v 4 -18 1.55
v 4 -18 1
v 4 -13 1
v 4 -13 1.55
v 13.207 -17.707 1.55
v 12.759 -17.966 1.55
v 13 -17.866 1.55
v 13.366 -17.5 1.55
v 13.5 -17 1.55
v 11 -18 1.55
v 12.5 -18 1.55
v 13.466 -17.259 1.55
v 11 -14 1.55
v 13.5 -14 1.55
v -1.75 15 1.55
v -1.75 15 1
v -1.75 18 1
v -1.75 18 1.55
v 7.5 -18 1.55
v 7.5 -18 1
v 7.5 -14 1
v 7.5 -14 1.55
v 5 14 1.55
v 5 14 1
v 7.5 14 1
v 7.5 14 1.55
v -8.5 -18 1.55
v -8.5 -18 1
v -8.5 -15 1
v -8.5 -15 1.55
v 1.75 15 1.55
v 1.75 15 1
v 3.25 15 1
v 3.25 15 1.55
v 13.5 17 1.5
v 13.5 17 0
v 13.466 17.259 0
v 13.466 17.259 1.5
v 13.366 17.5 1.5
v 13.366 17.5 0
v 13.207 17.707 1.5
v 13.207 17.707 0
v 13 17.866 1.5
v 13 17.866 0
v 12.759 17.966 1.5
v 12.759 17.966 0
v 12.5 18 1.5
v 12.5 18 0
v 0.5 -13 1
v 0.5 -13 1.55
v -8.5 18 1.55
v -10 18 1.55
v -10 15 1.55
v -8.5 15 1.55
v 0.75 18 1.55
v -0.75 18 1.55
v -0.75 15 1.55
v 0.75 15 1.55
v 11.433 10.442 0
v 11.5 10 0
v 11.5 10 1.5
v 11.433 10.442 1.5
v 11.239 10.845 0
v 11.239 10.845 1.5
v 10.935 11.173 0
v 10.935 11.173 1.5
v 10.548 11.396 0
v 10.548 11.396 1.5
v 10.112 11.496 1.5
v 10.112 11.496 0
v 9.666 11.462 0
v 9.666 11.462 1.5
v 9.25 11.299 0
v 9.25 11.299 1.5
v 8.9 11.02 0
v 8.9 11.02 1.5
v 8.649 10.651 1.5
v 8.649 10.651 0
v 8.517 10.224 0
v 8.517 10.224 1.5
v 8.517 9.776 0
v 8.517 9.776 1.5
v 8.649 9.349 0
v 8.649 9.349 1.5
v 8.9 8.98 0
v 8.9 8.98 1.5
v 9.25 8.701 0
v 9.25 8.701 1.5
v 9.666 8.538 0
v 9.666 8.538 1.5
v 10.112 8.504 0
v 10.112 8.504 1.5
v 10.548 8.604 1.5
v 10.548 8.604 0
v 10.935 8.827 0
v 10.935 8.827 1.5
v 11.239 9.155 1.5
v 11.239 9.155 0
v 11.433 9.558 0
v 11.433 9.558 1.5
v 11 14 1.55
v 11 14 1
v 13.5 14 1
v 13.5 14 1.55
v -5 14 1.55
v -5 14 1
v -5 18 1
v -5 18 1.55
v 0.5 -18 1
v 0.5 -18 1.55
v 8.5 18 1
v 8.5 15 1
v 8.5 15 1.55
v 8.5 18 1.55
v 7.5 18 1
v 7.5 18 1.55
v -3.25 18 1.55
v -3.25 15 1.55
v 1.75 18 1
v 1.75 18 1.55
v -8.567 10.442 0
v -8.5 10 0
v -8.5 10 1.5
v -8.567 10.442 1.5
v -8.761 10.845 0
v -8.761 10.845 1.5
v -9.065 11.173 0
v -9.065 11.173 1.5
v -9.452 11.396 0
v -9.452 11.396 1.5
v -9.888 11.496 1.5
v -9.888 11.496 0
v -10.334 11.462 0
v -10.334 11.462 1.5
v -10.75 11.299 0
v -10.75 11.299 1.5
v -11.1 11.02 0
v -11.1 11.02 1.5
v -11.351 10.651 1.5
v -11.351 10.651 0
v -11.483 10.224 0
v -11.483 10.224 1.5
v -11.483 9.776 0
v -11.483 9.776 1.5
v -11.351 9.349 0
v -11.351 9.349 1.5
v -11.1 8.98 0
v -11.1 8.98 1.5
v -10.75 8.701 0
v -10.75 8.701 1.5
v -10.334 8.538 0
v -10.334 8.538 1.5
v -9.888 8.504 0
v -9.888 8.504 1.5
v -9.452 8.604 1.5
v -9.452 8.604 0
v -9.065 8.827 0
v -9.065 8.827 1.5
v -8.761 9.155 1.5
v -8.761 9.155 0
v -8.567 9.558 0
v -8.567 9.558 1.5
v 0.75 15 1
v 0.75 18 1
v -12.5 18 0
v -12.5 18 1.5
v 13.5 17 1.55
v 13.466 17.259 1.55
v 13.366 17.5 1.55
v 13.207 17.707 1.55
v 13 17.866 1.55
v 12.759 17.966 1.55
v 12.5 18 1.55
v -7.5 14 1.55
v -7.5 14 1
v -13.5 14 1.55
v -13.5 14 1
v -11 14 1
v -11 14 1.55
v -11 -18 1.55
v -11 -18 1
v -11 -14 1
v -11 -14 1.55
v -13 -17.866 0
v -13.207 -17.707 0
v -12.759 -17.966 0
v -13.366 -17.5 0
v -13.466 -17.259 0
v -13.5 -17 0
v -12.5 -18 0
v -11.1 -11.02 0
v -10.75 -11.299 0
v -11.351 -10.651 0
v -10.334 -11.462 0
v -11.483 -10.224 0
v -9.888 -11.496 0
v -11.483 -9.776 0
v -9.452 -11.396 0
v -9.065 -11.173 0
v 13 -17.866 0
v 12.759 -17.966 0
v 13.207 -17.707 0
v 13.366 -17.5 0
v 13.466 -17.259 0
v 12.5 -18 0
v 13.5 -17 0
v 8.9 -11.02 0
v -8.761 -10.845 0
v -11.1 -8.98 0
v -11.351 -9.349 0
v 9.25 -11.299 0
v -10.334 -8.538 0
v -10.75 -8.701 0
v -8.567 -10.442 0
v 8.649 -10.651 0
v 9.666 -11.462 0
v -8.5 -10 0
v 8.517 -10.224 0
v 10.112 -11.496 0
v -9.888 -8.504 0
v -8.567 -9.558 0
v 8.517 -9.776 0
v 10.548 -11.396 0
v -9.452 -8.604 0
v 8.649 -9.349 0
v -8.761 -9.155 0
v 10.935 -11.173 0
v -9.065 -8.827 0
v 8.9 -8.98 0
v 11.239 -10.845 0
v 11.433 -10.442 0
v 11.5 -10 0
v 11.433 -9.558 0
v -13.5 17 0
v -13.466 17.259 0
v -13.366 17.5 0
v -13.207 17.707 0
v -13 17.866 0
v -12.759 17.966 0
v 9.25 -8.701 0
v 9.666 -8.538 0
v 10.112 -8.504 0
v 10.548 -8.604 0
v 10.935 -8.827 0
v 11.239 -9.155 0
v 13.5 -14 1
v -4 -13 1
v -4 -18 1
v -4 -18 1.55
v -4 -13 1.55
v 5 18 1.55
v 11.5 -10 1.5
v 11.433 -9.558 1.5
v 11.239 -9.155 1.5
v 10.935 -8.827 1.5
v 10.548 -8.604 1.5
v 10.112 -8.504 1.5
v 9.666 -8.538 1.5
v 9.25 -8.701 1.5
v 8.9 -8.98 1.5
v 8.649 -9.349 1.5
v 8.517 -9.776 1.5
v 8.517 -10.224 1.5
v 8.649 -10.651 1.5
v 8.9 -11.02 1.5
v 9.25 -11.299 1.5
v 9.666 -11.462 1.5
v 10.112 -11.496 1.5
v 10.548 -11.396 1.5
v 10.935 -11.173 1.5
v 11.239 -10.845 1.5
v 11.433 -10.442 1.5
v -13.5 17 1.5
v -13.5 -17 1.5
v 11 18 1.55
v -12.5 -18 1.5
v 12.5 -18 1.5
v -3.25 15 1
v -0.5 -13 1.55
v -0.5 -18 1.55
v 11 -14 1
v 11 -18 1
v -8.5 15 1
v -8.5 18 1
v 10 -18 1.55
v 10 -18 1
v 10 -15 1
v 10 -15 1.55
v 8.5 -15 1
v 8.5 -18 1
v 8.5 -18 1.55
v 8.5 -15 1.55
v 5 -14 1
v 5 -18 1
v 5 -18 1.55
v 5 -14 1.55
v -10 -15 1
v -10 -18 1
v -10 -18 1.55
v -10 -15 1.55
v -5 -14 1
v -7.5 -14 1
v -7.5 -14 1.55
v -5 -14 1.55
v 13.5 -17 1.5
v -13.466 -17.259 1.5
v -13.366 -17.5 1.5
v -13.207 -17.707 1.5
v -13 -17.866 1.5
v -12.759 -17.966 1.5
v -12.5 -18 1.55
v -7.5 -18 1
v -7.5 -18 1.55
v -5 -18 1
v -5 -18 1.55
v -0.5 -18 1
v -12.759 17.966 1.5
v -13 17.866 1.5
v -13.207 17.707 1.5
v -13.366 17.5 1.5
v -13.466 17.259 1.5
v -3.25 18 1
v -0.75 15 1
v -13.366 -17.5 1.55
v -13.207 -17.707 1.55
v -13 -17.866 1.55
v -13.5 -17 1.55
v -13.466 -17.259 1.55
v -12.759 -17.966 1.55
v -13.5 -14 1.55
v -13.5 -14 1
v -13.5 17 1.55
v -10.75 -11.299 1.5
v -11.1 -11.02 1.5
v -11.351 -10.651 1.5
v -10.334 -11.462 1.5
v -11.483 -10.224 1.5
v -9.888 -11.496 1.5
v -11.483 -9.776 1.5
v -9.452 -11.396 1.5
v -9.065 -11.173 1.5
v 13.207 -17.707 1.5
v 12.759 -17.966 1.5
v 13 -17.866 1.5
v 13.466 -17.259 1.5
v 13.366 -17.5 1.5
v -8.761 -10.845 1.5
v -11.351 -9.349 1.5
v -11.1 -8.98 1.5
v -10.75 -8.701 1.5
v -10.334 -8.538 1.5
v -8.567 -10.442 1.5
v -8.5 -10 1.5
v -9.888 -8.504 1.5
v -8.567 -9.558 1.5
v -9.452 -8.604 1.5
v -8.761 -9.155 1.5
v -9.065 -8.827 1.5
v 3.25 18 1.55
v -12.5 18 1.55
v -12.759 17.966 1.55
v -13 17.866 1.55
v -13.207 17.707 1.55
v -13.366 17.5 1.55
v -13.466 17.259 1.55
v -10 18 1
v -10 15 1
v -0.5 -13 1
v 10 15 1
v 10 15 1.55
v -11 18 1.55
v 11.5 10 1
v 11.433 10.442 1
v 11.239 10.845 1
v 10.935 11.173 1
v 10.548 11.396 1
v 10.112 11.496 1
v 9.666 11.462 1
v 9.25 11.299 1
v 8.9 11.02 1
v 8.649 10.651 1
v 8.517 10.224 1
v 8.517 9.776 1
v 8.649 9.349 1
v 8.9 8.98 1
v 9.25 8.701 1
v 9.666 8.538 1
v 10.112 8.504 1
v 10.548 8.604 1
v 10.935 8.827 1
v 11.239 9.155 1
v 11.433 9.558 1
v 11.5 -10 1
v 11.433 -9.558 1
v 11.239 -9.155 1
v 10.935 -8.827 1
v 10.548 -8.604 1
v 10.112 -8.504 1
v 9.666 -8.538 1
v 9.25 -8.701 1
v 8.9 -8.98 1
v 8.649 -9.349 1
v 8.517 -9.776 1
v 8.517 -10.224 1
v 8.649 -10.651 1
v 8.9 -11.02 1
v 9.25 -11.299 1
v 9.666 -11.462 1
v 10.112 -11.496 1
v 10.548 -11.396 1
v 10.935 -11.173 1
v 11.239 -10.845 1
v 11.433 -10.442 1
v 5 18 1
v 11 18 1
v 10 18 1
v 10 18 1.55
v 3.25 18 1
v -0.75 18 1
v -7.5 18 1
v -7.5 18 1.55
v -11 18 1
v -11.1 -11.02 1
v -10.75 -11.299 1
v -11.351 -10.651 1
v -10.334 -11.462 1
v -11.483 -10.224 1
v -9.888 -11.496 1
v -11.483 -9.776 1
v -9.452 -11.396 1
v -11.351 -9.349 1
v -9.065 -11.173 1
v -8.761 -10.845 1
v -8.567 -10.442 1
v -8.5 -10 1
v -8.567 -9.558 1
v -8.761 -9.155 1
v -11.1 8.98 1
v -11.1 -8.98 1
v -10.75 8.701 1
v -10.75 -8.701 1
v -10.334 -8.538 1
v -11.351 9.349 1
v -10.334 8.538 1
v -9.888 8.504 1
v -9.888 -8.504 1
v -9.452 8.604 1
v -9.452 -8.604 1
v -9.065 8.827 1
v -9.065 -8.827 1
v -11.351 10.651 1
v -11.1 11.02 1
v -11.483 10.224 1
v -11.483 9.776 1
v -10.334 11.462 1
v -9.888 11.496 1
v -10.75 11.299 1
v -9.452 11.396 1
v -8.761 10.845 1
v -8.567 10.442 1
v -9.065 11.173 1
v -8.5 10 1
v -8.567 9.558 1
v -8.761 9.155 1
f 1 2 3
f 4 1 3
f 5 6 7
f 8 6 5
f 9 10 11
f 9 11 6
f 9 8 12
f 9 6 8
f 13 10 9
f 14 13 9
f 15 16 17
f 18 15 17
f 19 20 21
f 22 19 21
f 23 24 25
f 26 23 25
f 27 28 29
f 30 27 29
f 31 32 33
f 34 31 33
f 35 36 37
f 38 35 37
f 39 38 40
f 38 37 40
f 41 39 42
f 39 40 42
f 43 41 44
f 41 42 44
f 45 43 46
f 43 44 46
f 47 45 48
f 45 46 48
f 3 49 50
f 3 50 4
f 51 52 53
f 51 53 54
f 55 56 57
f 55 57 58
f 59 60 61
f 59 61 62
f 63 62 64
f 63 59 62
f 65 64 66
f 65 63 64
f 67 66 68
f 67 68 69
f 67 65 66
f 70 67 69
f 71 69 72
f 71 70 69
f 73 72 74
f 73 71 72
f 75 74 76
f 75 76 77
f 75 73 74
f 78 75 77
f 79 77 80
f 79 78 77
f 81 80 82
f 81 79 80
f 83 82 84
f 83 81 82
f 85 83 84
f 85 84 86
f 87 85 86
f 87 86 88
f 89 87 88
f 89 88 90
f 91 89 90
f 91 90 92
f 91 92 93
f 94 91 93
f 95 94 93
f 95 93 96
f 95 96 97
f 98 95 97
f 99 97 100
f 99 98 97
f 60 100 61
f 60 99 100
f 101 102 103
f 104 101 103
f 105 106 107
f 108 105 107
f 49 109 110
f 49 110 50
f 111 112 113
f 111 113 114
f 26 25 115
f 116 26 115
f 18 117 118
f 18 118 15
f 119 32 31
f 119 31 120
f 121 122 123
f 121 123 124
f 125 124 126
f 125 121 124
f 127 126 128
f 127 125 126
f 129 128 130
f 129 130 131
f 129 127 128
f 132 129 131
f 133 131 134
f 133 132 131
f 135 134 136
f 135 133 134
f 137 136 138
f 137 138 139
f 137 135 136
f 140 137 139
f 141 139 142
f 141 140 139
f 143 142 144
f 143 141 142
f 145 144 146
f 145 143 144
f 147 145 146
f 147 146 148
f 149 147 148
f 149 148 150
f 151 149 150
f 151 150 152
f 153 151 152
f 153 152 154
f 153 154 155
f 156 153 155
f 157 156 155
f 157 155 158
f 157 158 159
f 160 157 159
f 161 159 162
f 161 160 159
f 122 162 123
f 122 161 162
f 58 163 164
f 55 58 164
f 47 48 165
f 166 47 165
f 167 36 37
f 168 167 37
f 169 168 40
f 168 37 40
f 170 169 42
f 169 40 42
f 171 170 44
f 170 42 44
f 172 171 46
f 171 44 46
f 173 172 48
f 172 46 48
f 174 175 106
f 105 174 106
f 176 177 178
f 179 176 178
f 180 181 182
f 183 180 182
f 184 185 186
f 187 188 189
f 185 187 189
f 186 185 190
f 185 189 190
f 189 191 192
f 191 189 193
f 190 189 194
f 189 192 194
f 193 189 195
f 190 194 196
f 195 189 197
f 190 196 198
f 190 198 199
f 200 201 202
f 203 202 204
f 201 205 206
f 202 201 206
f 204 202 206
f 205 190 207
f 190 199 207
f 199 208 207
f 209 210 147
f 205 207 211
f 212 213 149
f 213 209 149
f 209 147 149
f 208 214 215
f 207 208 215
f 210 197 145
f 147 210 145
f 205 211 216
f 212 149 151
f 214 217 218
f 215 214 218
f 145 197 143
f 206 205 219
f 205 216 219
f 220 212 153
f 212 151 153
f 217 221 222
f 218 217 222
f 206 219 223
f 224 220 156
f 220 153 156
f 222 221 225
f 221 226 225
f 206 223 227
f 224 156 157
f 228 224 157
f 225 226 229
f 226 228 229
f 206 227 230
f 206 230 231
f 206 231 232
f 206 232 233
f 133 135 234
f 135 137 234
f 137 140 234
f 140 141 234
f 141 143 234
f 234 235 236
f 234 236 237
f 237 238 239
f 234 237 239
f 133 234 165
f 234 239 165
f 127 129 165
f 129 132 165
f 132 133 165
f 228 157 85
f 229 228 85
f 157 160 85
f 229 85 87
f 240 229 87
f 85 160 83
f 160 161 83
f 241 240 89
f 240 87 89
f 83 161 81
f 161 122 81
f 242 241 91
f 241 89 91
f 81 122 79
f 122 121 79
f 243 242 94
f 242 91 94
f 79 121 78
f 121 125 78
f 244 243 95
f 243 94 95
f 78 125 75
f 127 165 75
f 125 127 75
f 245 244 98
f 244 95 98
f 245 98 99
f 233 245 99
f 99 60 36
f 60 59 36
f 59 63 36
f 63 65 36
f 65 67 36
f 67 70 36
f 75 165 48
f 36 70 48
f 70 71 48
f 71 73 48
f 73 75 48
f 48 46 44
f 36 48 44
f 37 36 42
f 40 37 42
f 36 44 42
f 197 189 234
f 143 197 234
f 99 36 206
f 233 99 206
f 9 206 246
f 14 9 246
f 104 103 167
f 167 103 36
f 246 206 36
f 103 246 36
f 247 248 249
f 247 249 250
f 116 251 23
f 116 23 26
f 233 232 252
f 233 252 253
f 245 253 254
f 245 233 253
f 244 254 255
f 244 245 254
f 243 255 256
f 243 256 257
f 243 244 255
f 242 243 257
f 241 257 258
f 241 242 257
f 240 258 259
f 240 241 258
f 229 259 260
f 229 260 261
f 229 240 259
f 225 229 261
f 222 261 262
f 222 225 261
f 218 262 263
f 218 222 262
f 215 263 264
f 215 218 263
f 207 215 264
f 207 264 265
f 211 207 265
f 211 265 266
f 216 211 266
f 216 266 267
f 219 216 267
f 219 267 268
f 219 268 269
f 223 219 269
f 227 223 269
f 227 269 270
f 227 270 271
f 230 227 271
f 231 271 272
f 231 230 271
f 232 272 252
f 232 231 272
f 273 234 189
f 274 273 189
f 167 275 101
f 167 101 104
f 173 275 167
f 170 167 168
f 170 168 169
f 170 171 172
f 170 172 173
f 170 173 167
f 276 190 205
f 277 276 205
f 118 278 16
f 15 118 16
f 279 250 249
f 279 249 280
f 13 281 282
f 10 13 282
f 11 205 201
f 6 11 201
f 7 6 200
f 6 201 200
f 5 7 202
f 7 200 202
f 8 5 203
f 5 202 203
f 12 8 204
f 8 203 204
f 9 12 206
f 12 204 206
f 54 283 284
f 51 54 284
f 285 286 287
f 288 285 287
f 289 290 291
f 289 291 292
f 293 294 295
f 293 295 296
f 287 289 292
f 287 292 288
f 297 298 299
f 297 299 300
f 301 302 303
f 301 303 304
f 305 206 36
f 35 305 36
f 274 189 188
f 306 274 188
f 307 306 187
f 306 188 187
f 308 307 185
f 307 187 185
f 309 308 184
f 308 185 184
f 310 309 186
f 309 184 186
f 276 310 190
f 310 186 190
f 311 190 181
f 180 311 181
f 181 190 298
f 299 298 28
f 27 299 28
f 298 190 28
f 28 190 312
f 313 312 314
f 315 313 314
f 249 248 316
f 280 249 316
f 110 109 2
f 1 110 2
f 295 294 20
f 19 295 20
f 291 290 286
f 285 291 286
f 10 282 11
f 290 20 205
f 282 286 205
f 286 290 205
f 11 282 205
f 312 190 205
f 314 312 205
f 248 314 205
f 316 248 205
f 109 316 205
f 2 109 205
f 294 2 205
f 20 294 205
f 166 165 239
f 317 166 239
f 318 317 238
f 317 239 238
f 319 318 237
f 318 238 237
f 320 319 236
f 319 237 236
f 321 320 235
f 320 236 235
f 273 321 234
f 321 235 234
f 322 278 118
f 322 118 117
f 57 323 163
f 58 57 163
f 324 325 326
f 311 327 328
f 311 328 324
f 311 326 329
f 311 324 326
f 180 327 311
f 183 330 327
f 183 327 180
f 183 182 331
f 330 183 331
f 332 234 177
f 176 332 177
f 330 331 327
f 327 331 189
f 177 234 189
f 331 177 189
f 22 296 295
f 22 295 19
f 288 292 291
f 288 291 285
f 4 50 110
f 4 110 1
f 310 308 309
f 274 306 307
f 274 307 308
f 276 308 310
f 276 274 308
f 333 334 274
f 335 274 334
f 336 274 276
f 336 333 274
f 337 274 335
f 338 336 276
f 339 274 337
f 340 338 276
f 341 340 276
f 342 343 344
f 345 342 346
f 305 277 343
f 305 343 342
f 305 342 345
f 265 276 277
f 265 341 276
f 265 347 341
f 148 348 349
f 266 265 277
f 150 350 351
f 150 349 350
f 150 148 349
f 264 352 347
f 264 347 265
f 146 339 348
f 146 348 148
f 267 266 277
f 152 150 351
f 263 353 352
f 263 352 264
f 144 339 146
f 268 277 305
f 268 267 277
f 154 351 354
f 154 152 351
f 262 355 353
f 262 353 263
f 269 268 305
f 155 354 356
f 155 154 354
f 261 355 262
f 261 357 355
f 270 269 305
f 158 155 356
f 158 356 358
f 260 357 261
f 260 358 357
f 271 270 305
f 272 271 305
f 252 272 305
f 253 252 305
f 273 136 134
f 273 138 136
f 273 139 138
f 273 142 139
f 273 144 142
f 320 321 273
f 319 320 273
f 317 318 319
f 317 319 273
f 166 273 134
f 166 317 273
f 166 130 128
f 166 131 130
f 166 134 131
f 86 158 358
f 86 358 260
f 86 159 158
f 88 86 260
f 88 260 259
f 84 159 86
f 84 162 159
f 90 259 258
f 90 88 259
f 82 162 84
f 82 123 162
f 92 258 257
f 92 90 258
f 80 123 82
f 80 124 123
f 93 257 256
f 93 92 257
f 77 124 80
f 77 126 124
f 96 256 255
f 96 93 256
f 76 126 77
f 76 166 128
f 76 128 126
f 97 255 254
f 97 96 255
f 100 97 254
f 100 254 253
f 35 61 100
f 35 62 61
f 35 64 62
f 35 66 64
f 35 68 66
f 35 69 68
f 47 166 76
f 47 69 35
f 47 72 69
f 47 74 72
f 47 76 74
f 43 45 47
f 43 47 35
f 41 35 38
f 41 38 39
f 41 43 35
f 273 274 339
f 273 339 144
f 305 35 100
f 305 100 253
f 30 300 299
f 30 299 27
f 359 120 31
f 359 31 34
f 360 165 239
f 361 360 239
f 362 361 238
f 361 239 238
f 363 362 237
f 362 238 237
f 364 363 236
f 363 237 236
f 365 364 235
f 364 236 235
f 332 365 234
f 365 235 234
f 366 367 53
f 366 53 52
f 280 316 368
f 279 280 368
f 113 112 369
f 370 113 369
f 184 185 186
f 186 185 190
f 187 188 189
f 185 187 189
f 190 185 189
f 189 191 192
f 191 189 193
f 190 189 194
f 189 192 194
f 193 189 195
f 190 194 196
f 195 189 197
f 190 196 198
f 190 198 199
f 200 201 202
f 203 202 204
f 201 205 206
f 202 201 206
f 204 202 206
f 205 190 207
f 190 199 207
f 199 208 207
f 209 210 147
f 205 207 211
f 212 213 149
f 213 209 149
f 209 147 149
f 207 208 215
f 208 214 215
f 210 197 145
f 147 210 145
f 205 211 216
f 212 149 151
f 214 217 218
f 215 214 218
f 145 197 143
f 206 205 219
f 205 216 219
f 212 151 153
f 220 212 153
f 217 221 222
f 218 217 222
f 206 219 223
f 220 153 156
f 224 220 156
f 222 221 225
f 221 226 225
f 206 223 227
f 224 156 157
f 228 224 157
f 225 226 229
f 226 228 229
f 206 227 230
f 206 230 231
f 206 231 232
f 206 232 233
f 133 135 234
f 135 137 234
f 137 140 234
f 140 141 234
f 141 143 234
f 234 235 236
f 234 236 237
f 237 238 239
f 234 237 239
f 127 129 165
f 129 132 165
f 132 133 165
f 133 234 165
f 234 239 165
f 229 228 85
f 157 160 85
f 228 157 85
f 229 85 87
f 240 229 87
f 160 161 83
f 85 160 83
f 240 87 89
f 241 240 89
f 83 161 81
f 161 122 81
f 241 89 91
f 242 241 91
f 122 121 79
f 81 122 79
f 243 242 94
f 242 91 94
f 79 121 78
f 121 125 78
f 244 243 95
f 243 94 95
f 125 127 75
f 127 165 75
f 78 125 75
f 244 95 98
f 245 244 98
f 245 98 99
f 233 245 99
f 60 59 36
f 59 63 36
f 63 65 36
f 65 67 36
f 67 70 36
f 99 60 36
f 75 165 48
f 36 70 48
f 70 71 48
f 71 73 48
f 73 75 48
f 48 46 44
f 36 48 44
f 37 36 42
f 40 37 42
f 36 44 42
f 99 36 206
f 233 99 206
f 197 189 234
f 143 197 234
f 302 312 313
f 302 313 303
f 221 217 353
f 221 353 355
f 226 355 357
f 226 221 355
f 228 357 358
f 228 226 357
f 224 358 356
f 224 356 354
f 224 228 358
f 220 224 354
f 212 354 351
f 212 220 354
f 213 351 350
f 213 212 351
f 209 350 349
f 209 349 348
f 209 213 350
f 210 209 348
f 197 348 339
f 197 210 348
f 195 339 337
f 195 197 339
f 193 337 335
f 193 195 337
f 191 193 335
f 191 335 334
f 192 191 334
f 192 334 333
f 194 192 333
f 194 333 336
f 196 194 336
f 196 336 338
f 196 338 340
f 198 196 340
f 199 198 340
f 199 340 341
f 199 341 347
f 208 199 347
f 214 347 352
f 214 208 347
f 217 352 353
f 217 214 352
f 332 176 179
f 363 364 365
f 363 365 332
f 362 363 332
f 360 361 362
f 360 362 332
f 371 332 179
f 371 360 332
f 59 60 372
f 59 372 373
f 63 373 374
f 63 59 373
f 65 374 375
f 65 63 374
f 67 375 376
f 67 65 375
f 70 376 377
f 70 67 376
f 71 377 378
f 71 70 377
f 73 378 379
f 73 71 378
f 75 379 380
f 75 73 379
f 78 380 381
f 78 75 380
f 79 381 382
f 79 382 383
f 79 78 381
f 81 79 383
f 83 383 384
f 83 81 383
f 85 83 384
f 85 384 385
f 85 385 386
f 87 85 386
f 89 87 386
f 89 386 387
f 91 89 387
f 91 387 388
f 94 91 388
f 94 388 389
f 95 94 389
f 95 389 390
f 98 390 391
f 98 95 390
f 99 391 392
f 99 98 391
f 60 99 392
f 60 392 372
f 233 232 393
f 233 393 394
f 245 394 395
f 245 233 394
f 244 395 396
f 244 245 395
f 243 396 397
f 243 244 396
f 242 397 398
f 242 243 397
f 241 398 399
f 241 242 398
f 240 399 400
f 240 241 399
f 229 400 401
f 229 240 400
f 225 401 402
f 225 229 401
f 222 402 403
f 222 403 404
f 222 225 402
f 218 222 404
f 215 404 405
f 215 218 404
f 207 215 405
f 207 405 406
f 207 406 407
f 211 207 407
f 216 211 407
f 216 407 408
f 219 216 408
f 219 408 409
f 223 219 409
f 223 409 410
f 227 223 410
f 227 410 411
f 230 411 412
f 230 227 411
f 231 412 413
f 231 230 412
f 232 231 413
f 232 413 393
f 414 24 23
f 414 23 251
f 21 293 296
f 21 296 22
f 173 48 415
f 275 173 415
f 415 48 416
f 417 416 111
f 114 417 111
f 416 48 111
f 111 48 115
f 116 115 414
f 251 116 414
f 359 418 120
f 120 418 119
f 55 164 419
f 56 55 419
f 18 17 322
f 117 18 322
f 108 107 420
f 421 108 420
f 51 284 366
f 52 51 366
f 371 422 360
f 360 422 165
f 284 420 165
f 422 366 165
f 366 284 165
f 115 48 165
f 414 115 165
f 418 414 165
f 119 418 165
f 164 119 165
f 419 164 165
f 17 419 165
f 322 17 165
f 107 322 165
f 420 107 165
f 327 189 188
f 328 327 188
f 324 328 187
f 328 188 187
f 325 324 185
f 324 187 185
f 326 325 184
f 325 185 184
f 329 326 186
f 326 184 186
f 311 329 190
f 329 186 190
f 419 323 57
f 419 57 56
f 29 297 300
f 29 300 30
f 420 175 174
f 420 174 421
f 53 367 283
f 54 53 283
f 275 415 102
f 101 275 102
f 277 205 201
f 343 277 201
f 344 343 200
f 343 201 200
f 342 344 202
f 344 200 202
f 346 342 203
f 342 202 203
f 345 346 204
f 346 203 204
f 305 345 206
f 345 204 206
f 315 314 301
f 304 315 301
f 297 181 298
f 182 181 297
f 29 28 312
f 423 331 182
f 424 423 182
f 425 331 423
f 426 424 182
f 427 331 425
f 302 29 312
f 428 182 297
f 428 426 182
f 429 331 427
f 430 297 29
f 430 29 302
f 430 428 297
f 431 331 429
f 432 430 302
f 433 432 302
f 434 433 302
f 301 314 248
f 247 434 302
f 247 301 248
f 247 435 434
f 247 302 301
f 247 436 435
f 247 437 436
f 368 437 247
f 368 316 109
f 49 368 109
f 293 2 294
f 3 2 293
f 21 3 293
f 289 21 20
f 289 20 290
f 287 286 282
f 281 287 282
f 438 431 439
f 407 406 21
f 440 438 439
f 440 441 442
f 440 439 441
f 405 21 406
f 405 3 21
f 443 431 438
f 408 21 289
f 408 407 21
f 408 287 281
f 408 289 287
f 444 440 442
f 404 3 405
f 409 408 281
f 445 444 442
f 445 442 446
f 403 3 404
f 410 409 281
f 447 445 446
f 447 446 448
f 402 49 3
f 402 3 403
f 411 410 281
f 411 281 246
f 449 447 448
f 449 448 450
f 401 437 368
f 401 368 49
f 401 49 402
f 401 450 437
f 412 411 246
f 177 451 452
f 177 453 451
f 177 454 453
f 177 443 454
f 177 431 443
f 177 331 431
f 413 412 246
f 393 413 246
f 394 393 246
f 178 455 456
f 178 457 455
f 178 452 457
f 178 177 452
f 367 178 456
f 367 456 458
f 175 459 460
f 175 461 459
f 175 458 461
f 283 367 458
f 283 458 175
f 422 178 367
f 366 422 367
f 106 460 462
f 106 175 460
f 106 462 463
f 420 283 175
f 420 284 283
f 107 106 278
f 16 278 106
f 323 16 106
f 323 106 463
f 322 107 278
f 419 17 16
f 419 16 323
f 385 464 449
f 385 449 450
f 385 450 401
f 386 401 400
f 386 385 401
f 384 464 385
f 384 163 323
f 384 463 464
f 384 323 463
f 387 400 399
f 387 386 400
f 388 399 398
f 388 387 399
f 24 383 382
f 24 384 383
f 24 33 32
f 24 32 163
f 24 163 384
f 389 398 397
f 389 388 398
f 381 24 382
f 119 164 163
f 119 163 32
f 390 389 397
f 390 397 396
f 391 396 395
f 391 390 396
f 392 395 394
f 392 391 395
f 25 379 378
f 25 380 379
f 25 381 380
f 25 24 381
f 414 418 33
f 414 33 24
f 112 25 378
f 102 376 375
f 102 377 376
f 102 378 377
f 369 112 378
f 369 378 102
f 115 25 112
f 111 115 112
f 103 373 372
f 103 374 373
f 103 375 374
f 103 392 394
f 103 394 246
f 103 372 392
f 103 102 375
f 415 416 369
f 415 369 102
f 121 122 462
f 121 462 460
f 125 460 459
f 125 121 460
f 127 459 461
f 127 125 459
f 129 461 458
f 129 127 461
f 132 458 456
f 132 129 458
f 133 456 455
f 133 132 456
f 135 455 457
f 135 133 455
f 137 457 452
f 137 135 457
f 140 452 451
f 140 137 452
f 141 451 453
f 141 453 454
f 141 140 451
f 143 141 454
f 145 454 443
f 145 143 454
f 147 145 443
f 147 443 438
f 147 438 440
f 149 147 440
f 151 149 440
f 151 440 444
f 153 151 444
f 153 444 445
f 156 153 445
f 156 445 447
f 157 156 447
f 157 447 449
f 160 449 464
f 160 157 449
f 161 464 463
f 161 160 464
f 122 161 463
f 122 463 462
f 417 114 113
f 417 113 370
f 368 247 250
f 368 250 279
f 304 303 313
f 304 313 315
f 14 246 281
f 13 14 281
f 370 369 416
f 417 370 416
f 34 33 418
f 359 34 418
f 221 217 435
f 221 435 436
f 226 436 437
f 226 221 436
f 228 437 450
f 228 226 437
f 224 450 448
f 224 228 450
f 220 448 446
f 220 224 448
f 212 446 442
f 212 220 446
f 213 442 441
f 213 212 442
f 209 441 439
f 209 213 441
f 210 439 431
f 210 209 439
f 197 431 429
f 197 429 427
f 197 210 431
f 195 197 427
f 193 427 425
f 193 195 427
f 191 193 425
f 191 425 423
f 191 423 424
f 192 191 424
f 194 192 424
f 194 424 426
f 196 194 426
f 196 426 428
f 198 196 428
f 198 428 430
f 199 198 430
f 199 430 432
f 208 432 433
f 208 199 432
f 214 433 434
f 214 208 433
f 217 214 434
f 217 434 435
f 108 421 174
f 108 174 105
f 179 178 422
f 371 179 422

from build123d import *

# Parameters (mm, degrees)
F0_R     = 1.5
F0_W     = 1.5
F0_H     = 3
F0_W_2   = 2.5
F0_H_2   = 4
F0_W_3   = 3.5
F0_H_3   = 5
F1_DEPTH = 1.5
F2_DEPTH = 1
F3_DEPTH = 1.55


# Not quite as in the source:
# - a feature names something its author has since deleted; it is built from what else it names


with BuildPart() as f1:
    # F0 (on Top) → F1 (new body)
    with BuildSketch(Plane.XY):
        with BuildLine():
            ThreePointArc((13.5, 17), (13.2071067812, 17.7071067812), (12.5, 18))
            Line((12.5, 18), (11, 18))
            Line((11, 18), (11, 14))
            Line((11, 14), (13.5, 14))
            Line((13.5, 14), (13.5, 17))
        make_face()
        Polygon((11, 14), (11, 18), (10, 18), (10, 15), (8.5, 15), (8.5, 18), (7.5, 18), (7.5, 14), (5, 14), (5, 18), (3.25, 18), (3.25, 15), (1.75, 15), (1.75, 18), (0.75, 18), (0.75, 15), (-0.75, 15), (-0.75, 18), (-1.75, 18), (-1.75, 15), (-3.25, 15), (-3.25, 18), (-5, 18), (-5, 14), (-7.5, 14), (-7.5, 18), (-8.5, 18), (-8.5, 15), (-10, 15), (-10, 18), (-11, 18), (-11, 14), (-13.5, 14), (-13.5, -14), (-11, -14), (-11, -18), (-10, -18), (-10, -15), (-8.5, -15), (-8.5, -18), (-7.5, -18), (-7.5, -14), (-5, -14), (-5, -18), (-4, -18), (-4, -13), (-0.5, -13), (-0.5, -18), (0.5, -18), (0.5, -13), (4, -13), (4, -18), (5, -18), (5, -14), (7.5, -14), (7.5, -18), (8.5, -18), (8.5, -15), (10, -15), (10, -18), (11, -18), (11, -14), (13.5, -14), (13.5, 14), align=None)
        with Locations((-10, -10)):
            Circle(F0_R, mode=Mode.SUBTRACT)
        with Locations((10, -10)):
            Circle(F0_R, mode=Mode.SUBTRACT)
        with Locations((-10, 10)):
            Circle(F0_R, mode=Mode.SUBTRACT)
        with Locations((10, 10)):
            Circle(F0_R, mode=Mode.SUBTRACT)
        with Locations((9.25, 16.5)):
            Rectangle(F0_W, F0_H)
        with BuildLine():
            Line((13.5, -17), (13.5, -14))
            Line((13.5, -14), (11, -14))
            Line((11, -14), (11, -18))
            Line((11, -18), (12.5, -18))
            ThreePointArc((12.5, -18), (13.2071067812, -17.7071067812), (13.5, -17))
        make_face()
        with Locations((6.25, 16)):
            Rectangle(F0_W_2, F0_H_2)
        with Locations((2.5, 16.5)):
            Rectangle(F0_W, F0_H)
        with Locations((9.25, -16.5)):
            Rectangle(F0_W, F0_H)
        with Locations((0, 16.5)):
            Rectangle(F0_W, F0_H)
        with Locations((6.25, -16)):
            Rectangle(F0_W_2, F0_H_2)
        with Locations((-2.5, 16.5)):
            Rectangle(F0_W, F0_H)
        with Locations((2.25, -15.5)):
            Rectangle(F0_W_3, F0_H_3)
        with Locations((-6.25, 16)):
            Rectangle(F0_W_2, F0_H_2)
        with Locations((-2.25, -15.5)):
            Rectangle(F0_W_3, F0_H_3)
        with Locations((-9.25, 16.5)):
            Rectangle(F0_W, F0_H)
        with Locations((-6.25, -16)):
            Rectangle(F0_W_2, F0_H_2)
        with BuildLine():
            Line((-11, 14), (-11, 18))
            Line((-11, 18), (-12.5, 18))
            ThreePointArc((-12.5, 18), (-13.2071067812, 17.7071067812), (-13.5, 17))
            Line((-13.5, 17), (-13.5, 14))
            Line((-13.5, 14), (-11, 14))
        make_face()
        with Locations((-9.25, -16.5)):
            Rectangle(F0_W, F0_H)
        with BuildLine():
            Line((-12.5, -18), (-11, -18))
            Line((-11, -18), (-11, -14))
            Line((-11, -14), (-13.5, -14))
            Line((-13.5, -14), (-13.5, -17))
            ThreePointArc((-13.5, -17), (-13.2071067812, -17.7071067812), (-12.5, -18))
        make_face()
    extrude(amount=F1_DEPTH)


with BuildPart() as f2:
    # F0 (on Top) → F2 (new body)
    with BuildSketch(Plane.XY):
        with BuildLine():
            ThreePointArc((13.5, 17), (13.2071067812, 17.7071067812), (12.5, 18))
            Line((12.5, 18), (11, 18))
            Line((11, 18), (11, 14))
            Line((11, 14), (13.5, 14))
            Line((13.5, 14), (13.5, 17))
        make_face()
        Polygon((11, 14), (11, 18), (10, 18), (10, 15), (8.5, 15), (8.5, 18), (7.5, 18), (7.5, 14), (5, 14), (5, 18), (3.25, 18), (3.25, 15), (1.75, 15), (1.75, 18), (0.75, 18), (0.75, 15), (-0.75, 15), (-0.75, 18), (-1.75, 18), (-1.75, 15), (-3.25, 15), (-3.25, 18), (-5, 18), (-5, 14), (-7.5, 14), (-7.5, 18), (-8.5, 18), (-8.5, 15), (-10, 15), (-10, 18), (-11, 18), (-11, 14), (-13.5, 14), (-13.5, -14), (-11, -14), (-11, -18), (-10, -18), (-10, -15), (-8.5, -15), (-8.5, -18), (-7.5, -18), (-7.5, -14), (-5, -14), (-5, -18), (-4, -18), (-4, -13), (-0.5, -13), (-0.5, -18), (0.5, -18), (0.5, -13), (4, -13), (4, -18), (5, -18), (5, -14), (7.5, -14), (7.5, -18), (8.5, -18), (8.5, -15), (10, -15), (10, -18), (11, -18), (11, -14), (13.5, -14), (13.5, 14), align=None)
        with Locations((-10, -10)):
            Circle(F0_R, mode=Mode.SUBTRACT)
        with Locations((10, -10)):
            Circle(F0_R, mode=Mode.SUBTRACT)
        with Locations((-10, 10)):
            Circle(F0_R, mode=Mode.SUBTRACT)
        with Locations((10, 10)):
            Circle(F0_R, mode=Mode.SUBTRACT)
        with Locations((9.25, 16.5)):
            Rectangle(F0_W, F0_H)
        with BuildLine():
            Line((13.5, -17), (13.5, -14))
            Line((13.5, -14), (11, -14))
            Line((11, -14), (11, -18))
            Line((11, -18), (12.5, -18))
            ThreePointArc((12.5, -18), (13.2071067812, -17.7071067812), (13.5, -17))
        make_face()
        with Locations((6.25, 16)):
            Rectangle(F0_W_2, F0_H_2)
        with Locations((2.5, 16.5)):
            Rectangle(F0_W, F0_H)
        with Locations((9.25, -16.5)):
            Rectangle(F0_W, F0_H)
        with Locations((0, 16.5)):
            Rectangle(F0_W, F0_H)
        with Locations((6.25, -16)):
            Rectangle(F0_W_2, F0_H_2)
        with Locations((-2.5, 16.5)):
            Rectangle(F0_W, F0_H)
        with Locations((2.25, -15.5)):
            Rectangle(F0_W_3, F0_H_3)
        with Locations((-6.25, 16)):
            Rectangle(F0_W_2, F0_H_2)
        with Locations((-2.25, -15.5)):
            Rectangle(F0_W_3, F0_H_3)
        with Locations((-9.25, 16.5)):
            Rectangle(F0_W, F0_H)
        with Locations((-6.25, -16)):
            Rectangle(F0_W_2, F0_H_2)
        with BuildLine():
            Line((-11, 14), (-11, 18))
            Line((-11, 18), (-12.5, 18))
            ThreePointArc((-12.5, 18), (-13.2071067812, 17.7071067812), (-13.5, 17))
            Line((-13.5, 17), (-13.5, 14))
            Line((-13.5, 14), (-11, 14))
        make_face()
        with Locations((-9.25, -16.5)):
            Rectangle(F0_W, F0_H)
        with BuildLine():
            Line((-12.5, -18), (-11, -18))
            Line((-11, -18), (-11, -14))
            Line((-11, -14), (-13.5, -14))
            Line((-13.5, -14), (-13.5, -17))
            ThreePointArc((-13.5, -17), (-13.2071067812, -17.7071067812), (-12.5, -18))
        make_face()
    extrude(amount=F2_DEPTH)

    # F0 (on Top) → F3 (join)
    with BuildSketch(Plane.XY):
        with BuildLine():
            Line((-12.5, -18), (-11, -18))
            Line((-11, -18), (-11, -14))
            Line((-11, -14), (-13.5, -14))
            Line((-13.5, -14), (-13.5, -17))
            ThreePointArc((-13.5, -17), (-13.2071067812, -17.7071067812), (-12.5, -18))
        make_face()
        with Locations((-9.25, -16.5)):
            Rectangle(F0_W, F0_H)
        with Locations((-6.25, -16)):
            Rectangle(F0_W_2, F0_H_2)
        with Locations((-2.25, -15.5)):
            Rectangle(F0_W_3, F0_H_3)
        with Locations((2.25, -15.5)):
            Rectangle(F0_W_3, F0_H_3)
        with Locations((6.25, -16)):
            Rectangle(F0_W_2, F0_H_2)
        with Locations((9.25, -16.5)):
            Rectangle(F0_W, F0_H)
        with BuildLine():
            ThreePointArc((13.5, 17), (13.2071067812, 17.7071067812), (12.5, 18))
            Line((12.5, 18), (11, 18))
            Line((11, 18), (11, 14))
            Line((11, 14), (13.5, 14))
            Line((13.5, 14), (13.5, 17))
        make_face()
        with Locations((9.25, 16.5)):
            Rectangle(F0_W, F0_H)
        with Locations((6.25, 16)):
            Rectangle(F0_W_2, F0_H_2)
        with Locations((2.5, 16.5)):
            Rectangle(F0_W, F0_H)
        with Locations((0, 16.5)):
            Rectangle(F0_W, F0_H)
        with Locations((-2.5, 16.5)):
            Rectangle(F0_W, F0_H)
        with Locations((-6.25, 16)):
            Rectangle(F0_W_2, F0_H_2)
        with Locations((-9.25, 16.5)):
            Rectangle(F0_W, F0_H)
        with BuildLine():
            Line((-11, 14), (-11, 18))
            Line((-11, 18), (-12.5, 18))
            ThreePointArc((-12.5, 18), (-13.2071067812, 17.7071067812), (-13.5, 17))
            Line((-13.5, 17), (-13.5, 14))
            Line((-13.5, 14), (-11, 14))
        make_face()
        with BuildLine():
            Line((13.5, -17), (13.5, -14))
            Line((13.5, -14), (11, -14))
            Line((11, -14), (11, -18))
            Line((11, -18), (12.5, -18))
            ThreePointArc((12.5, -18), (13.2071067812, -17.7071067812), (13.5, -17))
        make_face()
    extrude(amount=F3_DEPTH)


solid = Compound([f1.part, f2.part])
